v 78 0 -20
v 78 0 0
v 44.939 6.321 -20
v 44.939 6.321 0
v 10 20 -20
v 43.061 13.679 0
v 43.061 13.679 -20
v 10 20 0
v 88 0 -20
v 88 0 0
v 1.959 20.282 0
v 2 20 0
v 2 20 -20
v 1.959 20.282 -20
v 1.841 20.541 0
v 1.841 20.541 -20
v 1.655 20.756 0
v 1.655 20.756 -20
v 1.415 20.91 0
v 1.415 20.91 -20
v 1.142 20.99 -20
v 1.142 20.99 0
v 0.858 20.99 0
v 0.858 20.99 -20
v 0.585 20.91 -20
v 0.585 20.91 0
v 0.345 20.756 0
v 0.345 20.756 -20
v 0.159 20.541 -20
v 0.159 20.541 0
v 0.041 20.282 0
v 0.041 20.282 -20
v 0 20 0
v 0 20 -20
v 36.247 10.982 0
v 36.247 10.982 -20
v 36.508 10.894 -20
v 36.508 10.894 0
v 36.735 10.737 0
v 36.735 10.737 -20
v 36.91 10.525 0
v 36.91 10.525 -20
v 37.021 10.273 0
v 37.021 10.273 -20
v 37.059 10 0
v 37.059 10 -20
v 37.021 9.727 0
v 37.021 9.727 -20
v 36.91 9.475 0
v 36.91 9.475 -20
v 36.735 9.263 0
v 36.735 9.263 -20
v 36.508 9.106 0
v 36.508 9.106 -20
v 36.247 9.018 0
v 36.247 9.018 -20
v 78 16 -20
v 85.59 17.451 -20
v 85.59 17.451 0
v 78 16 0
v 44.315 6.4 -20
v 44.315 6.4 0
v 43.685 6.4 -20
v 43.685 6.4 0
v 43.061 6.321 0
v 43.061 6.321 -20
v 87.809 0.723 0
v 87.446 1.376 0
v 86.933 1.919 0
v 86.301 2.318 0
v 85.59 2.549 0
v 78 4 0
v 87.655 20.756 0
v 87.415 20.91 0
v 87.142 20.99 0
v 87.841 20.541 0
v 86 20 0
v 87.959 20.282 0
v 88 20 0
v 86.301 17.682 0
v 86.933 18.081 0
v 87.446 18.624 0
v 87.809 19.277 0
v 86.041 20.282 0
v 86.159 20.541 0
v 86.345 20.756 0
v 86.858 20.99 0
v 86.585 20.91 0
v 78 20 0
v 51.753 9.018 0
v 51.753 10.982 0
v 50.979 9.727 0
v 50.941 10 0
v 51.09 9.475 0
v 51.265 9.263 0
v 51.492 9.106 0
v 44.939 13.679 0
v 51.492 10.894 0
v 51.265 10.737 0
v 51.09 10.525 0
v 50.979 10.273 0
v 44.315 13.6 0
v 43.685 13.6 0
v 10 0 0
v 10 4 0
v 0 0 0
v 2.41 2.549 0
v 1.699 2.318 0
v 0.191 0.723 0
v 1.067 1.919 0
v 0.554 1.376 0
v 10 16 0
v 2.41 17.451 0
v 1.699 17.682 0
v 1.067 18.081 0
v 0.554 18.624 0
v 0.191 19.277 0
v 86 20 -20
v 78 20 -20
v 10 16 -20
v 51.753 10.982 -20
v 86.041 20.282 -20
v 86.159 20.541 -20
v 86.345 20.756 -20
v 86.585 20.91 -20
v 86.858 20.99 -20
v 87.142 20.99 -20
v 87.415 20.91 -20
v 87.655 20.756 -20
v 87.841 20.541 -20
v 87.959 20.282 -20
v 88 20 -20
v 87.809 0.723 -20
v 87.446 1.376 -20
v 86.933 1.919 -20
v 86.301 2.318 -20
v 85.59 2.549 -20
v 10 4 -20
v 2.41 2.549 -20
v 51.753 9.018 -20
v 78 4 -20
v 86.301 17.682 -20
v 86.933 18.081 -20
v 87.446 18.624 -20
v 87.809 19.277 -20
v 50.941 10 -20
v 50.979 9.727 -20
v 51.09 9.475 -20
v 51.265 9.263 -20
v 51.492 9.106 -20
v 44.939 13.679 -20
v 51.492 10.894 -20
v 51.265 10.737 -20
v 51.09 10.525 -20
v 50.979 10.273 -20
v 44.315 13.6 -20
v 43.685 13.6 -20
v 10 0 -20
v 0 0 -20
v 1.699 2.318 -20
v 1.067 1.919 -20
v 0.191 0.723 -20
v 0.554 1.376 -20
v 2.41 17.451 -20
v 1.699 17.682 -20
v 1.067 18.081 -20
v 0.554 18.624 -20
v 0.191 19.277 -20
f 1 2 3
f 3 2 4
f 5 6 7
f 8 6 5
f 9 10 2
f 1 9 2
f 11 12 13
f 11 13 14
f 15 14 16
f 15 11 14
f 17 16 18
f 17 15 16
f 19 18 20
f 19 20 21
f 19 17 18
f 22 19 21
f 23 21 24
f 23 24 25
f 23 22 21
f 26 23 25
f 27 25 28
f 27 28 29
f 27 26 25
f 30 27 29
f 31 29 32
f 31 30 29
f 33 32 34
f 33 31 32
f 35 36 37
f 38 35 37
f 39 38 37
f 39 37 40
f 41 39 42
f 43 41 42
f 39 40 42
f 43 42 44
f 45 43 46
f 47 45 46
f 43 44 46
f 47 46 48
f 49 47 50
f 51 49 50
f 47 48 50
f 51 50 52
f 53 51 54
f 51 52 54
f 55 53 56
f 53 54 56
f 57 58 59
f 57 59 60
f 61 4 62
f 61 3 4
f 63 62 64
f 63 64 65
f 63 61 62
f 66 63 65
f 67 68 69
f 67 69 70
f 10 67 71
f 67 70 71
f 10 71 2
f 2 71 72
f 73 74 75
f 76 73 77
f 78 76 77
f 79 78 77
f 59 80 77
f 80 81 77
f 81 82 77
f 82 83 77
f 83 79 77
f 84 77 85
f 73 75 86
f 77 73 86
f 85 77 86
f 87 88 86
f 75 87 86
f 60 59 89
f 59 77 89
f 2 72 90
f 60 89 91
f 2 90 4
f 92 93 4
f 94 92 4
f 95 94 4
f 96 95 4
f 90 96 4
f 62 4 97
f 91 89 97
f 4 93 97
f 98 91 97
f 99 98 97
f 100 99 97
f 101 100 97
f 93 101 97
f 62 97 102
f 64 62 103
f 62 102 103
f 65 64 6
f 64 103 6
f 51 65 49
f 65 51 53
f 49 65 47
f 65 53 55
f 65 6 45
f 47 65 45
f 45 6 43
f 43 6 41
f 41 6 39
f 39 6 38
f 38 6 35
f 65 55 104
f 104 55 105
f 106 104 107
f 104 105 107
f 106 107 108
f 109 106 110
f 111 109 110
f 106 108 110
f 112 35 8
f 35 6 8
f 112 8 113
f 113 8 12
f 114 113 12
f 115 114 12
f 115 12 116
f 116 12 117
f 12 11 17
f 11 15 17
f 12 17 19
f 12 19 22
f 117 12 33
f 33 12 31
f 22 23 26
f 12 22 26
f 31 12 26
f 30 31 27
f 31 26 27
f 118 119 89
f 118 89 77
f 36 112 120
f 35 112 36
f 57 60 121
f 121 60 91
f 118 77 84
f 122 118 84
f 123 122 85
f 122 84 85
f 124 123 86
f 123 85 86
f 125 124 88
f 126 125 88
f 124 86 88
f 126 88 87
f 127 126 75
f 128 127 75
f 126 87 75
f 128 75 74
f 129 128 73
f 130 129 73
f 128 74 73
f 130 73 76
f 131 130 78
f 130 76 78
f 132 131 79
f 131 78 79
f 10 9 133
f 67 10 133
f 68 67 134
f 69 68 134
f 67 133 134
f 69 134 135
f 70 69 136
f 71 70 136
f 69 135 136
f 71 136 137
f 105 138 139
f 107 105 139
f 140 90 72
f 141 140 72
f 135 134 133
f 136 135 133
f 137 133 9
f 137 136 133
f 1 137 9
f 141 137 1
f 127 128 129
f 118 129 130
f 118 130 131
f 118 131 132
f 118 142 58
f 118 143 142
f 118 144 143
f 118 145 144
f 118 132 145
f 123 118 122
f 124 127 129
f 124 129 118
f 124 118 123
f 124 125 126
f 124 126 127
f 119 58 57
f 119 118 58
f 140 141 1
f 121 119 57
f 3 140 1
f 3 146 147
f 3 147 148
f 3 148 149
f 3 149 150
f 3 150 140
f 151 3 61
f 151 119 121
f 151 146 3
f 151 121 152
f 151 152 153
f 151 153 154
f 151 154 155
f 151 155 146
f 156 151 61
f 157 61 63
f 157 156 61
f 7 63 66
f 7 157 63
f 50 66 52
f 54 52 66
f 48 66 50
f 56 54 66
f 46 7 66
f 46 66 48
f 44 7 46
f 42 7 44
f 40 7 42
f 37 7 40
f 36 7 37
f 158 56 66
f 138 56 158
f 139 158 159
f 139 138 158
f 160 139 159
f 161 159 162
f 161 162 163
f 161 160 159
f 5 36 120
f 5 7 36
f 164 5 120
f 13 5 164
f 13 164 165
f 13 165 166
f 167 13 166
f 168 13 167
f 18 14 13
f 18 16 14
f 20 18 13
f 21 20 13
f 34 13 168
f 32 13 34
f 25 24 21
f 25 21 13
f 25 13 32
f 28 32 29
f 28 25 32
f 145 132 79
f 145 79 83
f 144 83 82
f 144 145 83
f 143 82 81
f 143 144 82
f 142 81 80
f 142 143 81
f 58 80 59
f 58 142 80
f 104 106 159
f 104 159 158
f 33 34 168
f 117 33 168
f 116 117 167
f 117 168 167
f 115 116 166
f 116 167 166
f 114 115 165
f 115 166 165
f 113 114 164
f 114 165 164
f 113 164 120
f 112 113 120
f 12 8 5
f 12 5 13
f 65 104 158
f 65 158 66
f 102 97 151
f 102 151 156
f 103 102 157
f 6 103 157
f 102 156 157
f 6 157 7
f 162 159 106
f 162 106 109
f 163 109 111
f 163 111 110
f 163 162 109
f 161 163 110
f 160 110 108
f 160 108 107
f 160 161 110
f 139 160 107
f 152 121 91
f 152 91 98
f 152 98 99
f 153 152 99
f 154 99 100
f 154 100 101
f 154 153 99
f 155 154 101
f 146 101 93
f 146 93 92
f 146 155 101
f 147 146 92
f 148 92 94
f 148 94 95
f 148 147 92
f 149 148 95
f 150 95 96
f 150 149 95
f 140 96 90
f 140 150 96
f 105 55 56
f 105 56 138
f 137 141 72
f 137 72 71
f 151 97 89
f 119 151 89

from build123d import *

# Parameters (mm, degrees)
F1_DEPTH    = 20
F2_T1_DEPTH = 20
F3_T1_DEPTH = 32.2692705553
F5_R        = 5


# Not quite as in the source:
# - a fillet or chamfer that OpenCascade refuses, or shapes differently, is made with other operations: its cross-section is extruded or revolved along the edge and cut away or added


with BuildPart() as f1:
    # F0 (on Top) → F1 (new body)
    with BuildSketch(Plane.XY):
        Polygon((0, 2.0882352941), (0, 0), (10, 0), (44, 6.5), (44, 13.5), (10, 20), (2, 20), (0, 20), (0, 17.9117647059), (10, 16), (41.3846153846, 10), (10, 4), align=None)
        with BuildLine():
            Line((0, 20), (2, 20))
            ThreePointArc((2, 20), (1, 21), (0, 20))
        make_face()
    extrude(amount=-F1_DEPTH)

    # F2: fillet of radius 1 on 1 edges, made by hand

    # F2_s2 → F2_t1 (join)
    with BuildSketch(Plane.XY.offset(-20)):
        with BuildLine():
            ThreePointArc((36.2468915209, 10.9822119151), (37.0591157136, 10), (36.2468915209, 9.0177880849))
            Line((36.2468915209, 9.0177880849), (41.3846153846, 10))
            Line((41.3846153846, 10), (36.2468915209, 10.9822119151))
        make_face()
    extrude(amount=F2_T1_DEPTH)

    # F3: fillet of radius 3 on 2 edges, made by hand

    # F3_s2 → F3_t1 (cut)
    with BuildSketch(Plane.XY.offset(-26.1346352777)):
        with BuildLine():
            ThreePointArc((0, 20), (0.7936912123, 18.3364871524), (2.4102047458, 17.4509902692))
            Line((2.4102047458, 17.4509902692), (2.3989381974, 17.3920575543))
            Line((2.3989381974, 17.3920575543), (-0.0112665484, 17.852831991))
            Line((-0.0112665484, 17.852831991), (-0.06, 17.9117647059))
            ThreePointArc((-0.06, 17.9117647059), (-0.06, 18.9558823529), (-0.0594706434, 19.9920474797))
            Line((-0.0594706434, 19.9920474797), (0, 20))
        make_face()
        with BuildLine():
            ThreePointArc((0, 0), (0.7936912123, 1.6635128476), (2.4102047458, 2.5490097308))
            Line((2.4102047458, 2.5490097308), (2.3989381974, 2.6079424457))
            Line((2.3989381974, 2.6079424457), (-0.0112665484, 2.147168009))
            Line((-0.0112665484, 2.147168009), (-0.06, 2.0882352941))
            ThreePointArc((-0.06, 2.0882352941), (-0.06, 1.0441176471), (-0.0594706434, 0.0079525203))
            Line((-0.0594706434, 0.0079525203), (0, 0))
        make_face()
    extrude(amount=F3_T1_DEPTH, mode=Mode.SUBTRACT)

    # F4: F1 across face


with BuildPart() as f1_1:
    add(f1.part)
    add(f1.part.mirror(Plane(origin=(44, 10, -10), x_dir=(0, 1, 0), z_dir=(1, 0, 0))))

    # F5
    f5_edges = [f1_1.edges().sort_by_distance(p)[0] for p in [
        (44, 13.5, -10),
        (44, 6.5, -10),
    ]]
    fillet(f5_edges, radius=F5_R)


solid = f1_1.part
